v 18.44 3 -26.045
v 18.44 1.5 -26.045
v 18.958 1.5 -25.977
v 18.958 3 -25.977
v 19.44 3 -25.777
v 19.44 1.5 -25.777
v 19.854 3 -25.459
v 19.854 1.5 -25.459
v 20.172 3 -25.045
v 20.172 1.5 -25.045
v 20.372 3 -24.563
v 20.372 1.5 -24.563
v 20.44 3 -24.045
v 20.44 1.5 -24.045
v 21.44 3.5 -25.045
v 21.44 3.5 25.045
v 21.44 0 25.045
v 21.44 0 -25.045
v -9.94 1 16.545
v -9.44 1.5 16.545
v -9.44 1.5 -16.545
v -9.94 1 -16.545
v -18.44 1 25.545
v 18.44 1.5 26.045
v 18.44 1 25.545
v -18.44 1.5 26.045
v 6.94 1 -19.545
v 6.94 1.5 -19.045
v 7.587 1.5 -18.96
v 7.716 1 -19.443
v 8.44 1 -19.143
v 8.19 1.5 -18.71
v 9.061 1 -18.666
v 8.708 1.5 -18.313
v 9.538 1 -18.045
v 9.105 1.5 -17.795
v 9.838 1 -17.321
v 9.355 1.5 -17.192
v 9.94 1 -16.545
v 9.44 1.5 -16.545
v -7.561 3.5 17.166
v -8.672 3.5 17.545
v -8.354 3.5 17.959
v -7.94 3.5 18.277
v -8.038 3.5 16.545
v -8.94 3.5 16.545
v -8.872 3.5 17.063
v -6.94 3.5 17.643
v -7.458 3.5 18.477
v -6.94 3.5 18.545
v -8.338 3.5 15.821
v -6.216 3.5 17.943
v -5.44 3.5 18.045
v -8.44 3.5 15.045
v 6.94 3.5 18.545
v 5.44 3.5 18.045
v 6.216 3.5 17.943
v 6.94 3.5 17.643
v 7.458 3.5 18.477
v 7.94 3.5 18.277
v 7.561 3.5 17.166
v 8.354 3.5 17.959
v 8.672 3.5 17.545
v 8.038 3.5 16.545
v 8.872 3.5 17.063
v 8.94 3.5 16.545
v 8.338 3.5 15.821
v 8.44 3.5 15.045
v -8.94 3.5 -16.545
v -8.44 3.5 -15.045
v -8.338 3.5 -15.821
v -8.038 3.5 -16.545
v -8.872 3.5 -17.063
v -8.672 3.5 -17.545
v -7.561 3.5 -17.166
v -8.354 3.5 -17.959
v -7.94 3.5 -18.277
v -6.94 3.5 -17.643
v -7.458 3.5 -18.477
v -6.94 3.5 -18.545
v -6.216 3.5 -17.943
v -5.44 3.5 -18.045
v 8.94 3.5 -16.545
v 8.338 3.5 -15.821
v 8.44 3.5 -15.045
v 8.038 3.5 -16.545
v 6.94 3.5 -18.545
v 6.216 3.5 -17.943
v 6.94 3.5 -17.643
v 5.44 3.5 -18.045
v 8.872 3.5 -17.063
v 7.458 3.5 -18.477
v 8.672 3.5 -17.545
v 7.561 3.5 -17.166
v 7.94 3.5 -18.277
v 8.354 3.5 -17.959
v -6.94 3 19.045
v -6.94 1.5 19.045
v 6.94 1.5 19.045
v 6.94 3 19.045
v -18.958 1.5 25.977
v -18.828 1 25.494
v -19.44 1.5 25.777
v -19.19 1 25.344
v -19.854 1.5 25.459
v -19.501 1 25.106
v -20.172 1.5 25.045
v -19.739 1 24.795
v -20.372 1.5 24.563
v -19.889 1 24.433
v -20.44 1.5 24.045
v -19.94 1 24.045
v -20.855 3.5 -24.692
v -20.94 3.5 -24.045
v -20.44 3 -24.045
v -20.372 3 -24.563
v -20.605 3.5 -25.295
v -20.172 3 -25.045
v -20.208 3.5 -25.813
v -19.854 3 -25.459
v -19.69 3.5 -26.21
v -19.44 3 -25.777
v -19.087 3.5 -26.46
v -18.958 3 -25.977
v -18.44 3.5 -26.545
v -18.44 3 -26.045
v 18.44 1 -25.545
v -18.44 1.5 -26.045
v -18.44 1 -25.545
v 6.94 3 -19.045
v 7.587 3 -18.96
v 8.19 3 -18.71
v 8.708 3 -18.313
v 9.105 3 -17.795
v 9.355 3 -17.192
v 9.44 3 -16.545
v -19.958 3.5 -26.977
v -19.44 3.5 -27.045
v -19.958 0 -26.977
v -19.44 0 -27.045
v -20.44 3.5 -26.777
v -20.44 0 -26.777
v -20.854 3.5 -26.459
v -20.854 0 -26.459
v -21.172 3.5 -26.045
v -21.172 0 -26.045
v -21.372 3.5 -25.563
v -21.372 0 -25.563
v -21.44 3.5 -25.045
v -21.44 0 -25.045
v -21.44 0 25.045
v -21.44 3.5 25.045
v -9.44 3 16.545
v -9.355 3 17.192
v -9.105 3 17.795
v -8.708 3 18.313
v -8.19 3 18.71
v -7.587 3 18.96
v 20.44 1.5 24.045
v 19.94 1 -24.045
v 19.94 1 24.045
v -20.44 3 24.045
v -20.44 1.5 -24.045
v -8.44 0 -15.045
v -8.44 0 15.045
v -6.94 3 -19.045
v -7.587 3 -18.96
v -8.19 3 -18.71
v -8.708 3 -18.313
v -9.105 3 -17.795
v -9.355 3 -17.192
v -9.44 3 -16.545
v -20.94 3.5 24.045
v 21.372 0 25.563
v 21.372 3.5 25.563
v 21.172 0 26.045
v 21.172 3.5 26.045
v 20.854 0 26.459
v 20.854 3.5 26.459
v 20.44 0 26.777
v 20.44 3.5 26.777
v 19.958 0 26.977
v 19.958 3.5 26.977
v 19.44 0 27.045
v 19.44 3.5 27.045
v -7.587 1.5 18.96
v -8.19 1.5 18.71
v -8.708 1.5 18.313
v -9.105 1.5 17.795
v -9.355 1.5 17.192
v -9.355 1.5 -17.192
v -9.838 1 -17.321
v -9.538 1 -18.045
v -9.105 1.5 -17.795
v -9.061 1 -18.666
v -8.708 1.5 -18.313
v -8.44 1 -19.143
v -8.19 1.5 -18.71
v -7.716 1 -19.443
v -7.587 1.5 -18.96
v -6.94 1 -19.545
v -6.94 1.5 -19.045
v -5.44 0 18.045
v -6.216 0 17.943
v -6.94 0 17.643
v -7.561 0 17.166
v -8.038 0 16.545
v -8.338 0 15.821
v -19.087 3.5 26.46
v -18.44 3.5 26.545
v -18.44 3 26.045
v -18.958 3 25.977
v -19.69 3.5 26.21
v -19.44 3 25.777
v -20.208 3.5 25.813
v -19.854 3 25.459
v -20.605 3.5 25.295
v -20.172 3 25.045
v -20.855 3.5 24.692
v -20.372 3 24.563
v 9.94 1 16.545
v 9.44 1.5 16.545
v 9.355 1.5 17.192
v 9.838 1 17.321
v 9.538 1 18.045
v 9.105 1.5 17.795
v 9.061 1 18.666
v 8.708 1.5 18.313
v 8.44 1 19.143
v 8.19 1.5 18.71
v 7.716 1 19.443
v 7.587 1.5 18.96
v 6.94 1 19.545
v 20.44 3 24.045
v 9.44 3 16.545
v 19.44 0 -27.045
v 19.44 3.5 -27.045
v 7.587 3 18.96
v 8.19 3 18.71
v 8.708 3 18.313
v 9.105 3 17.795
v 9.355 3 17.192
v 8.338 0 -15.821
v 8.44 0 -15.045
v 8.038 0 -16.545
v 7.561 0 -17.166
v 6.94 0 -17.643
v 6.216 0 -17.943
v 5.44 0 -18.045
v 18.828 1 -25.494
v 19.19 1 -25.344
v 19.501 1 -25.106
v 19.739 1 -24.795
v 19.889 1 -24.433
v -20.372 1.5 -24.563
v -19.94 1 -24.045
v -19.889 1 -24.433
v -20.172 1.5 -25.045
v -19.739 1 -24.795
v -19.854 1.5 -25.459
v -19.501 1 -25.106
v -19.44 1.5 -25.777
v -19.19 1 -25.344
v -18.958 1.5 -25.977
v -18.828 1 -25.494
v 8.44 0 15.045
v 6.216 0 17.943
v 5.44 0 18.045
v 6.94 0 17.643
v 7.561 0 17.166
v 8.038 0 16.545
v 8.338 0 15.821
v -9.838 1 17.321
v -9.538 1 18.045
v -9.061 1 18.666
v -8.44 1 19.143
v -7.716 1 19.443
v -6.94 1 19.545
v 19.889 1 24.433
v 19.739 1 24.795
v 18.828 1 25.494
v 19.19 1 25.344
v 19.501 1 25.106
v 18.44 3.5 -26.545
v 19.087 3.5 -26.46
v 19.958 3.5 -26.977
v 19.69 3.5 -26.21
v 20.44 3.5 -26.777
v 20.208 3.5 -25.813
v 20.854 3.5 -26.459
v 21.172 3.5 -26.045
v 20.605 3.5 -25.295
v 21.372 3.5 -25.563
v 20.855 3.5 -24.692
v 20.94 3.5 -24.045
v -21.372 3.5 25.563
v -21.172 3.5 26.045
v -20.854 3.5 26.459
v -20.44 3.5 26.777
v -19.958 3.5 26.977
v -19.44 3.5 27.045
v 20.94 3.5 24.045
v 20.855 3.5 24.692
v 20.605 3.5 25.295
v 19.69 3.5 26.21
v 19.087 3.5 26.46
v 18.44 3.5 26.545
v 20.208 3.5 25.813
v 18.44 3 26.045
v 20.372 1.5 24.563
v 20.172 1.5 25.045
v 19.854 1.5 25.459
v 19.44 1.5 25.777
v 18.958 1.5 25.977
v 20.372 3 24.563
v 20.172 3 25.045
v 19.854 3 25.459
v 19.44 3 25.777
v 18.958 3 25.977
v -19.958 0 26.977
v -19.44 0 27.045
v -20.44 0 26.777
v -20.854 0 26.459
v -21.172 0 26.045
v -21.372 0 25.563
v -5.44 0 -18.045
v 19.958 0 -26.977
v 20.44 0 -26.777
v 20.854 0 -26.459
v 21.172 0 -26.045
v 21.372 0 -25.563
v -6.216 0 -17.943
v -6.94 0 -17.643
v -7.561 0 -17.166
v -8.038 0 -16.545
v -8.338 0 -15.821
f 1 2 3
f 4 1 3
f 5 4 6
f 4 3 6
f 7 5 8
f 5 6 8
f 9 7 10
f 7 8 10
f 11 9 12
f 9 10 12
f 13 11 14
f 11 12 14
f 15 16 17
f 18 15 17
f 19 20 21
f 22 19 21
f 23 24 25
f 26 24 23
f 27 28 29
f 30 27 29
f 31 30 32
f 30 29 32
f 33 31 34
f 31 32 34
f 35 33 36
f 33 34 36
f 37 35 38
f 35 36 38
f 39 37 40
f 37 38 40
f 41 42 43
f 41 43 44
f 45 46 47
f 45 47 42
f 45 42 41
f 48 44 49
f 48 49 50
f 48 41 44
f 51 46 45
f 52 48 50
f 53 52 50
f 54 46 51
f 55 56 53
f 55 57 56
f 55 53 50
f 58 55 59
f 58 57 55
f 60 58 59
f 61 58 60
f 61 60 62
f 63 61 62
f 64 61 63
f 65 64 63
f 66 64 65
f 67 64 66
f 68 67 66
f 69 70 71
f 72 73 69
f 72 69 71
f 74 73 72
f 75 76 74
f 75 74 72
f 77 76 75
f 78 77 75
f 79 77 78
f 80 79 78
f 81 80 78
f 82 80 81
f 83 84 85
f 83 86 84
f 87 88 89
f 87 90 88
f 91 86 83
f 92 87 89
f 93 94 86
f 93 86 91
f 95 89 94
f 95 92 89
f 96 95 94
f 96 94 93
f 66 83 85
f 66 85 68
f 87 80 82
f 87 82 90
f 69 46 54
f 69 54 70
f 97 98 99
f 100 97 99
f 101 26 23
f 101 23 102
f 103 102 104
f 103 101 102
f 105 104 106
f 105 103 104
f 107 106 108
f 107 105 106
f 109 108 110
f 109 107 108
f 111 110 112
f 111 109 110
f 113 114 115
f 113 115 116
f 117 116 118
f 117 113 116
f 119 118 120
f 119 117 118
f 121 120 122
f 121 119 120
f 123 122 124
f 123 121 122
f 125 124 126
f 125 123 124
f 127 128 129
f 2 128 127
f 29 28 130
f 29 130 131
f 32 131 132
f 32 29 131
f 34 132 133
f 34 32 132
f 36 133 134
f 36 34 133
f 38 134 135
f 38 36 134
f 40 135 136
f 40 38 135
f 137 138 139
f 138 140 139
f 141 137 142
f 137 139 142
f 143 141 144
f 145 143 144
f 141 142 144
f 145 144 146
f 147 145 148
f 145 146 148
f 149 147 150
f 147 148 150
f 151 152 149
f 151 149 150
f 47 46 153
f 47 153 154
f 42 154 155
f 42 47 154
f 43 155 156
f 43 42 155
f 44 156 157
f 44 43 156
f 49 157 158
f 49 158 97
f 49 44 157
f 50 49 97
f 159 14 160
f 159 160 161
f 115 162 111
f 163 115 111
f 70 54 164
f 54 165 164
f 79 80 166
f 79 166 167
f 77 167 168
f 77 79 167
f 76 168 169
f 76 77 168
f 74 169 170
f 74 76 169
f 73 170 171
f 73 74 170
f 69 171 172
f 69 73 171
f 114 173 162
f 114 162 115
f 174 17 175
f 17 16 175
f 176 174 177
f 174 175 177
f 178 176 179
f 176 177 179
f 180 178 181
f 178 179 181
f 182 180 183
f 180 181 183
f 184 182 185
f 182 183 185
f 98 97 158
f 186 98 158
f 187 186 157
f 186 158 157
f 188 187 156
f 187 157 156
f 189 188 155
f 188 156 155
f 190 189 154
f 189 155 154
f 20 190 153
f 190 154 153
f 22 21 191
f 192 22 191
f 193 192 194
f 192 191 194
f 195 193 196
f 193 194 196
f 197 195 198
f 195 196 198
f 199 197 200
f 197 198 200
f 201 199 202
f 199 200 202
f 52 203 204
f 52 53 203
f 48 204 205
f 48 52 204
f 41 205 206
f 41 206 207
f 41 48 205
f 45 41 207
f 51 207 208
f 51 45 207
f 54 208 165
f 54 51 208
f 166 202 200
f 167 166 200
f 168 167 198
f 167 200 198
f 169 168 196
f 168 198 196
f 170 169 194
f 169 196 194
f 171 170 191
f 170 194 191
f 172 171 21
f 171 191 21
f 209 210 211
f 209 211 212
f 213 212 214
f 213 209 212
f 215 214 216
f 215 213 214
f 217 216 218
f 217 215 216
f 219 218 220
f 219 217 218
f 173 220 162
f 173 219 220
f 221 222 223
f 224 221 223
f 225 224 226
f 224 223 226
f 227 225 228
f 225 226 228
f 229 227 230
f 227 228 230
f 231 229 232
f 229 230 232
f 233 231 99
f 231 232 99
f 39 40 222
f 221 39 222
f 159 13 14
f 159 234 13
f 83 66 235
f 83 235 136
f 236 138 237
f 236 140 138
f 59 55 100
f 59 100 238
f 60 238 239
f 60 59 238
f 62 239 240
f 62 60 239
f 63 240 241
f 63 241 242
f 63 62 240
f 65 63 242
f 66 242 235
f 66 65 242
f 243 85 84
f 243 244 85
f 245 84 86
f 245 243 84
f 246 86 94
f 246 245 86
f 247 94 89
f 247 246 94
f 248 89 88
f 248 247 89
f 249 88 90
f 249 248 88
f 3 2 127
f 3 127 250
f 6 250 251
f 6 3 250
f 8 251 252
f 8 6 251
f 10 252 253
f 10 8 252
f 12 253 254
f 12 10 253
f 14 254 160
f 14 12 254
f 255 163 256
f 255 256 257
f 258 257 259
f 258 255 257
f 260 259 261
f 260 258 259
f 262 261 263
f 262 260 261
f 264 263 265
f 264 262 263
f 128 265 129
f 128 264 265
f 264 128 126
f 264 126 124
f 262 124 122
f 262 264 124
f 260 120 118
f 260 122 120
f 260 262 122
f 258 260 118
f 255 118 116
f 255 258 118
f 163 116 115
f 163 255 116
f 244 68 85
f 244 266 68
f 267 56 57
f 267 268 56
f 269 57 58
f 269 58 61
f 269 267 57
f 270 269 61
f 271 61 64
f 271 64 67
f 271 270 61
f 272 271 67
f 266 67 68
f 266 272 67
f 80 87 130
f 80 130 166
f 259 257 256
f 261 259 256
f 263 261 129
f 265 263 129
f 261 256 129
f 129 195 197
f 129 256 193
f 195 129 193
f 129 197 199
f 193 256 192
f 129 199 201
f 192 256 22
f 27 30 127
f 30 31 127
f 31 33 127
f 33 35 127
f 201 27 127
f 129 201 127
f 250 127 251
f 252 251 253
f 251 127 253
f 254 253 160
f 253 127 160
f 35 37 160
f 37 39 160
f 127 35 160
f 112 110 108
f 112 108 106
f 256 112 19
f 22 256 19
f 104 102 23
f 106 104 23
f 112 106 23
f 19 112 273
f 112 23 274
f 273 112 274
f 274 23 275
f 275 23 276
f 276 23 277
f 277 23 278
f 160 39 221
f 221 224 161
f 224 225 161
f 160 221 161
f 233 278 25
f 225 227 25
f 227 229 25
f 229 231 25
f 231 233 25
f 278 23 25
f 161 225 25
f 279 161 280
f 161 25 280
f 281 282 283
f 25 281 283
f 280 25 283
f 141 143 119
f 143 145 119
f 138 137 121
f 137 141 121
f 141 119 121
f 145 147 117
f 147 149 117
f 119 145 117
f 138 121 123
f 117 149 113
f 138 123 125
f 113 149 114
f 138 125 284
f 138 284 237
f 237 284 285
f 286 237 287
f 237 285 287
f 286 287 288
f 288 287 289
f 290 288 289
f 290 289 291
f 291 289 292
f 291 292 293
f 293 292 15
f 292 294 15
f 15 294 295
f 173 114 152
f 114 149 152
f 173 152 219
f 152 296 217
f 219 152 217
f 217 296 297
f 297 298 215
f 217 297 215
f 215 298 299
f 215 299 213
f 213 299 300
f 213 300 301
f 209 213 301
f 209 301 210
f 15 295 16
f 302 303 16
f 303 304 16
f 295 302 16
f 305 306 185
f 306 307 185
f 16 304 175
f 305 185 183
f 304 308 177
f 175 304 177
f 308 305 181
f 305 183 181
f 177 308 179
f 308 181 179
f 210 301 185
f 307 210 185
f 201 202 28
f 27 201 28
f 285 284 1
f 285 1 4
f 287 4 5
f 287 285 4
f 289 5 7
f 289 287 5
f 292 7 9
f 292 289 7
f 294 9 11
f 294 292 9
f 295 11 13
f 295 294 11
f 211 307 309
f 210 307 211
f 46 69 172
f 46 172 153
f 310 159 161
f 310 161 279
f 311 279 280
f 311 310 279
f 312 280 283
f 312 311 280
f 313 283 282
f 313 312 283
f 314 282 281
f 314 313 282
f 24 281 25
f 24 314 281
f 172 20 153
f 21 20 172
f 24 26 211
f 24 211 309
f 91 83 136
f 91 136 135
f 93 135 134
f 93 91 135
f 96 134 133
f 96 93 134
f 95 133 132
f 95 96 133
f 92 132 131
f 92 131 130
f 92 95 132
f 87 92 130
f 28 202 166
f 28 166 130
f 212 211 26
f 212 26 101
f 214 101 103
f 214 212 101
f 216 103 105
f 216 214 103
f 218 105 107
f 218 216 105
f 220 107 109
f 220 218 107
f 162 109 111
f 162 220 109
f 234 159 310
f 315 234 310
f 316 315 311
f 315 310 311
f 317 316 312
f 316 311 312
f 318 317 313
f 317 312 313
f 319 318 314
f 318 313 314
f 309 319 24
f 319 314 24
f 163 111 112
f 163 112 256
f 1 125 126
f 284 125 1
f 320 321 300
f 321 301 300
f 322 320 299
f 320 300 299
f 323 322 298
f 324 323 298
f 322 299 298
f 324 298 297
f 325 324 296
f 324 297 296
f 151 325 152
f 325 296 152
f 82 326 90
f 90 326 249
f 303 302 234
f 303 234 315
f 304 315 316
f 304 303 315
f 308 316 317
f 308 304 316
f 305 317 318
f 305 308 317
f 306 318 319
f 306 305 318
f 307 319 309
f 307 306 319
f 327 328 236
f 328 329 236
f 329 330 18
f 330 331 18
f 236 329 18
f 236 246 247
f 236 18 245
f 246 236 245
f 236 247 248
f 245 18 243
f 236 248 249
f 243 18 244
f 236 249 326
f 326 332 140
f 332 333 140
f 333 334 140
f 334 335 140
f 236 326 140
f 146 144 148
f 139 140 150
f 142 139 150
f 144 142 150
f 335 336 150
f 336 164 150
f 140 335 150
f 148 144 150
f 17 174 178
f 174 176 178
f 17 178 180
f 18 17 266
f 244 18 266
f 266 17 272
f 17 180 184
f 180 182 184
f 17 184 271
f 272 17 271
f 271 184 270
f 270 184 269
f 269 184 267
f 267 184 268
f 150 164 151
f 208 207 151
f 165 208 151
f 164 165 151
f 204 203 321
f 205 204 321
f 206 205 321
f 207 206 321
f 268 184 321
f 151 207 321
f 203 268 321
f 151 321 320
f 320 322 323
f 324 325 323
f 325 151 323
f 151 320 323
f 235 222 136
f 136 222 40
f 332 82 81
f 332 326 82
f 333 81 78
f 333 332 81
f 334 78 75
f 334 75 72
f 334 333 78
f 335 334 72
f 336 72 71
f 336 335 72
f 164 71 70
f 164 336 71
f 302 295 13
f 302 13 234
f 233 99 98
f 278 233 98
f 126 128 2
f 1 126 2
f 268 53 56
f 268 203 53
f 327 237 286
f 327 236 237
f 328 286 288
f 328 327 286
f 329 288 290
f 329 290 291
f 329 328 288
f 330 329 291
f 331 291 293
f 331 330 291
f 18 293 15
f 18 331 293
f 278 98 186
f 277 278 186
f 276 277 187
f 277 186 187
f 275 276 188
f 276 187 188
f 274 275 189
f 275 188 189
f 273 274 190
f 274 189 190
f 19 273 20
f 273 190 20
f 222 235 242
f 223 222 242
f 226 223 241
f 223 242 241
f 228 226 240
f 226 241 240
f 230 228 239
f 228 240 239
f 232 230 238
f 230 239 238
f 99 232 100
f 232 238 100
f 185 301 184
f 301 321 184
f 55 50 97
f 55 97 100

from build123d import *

# Parameters (mm, degrees)
SKETCH1_W              = 11
SKETCH1_H              = 38.09
BOSS_EXTRUDE1_DEPTH    = 3
BOSS_EXTRUDE2_DEPTH    = 3
SKETCH3_W              = 40.88
SKETCH3_H              = 46.09
CUT_EXTRUDE1_DEPTH     = 2
MOVE_START             = 3
MOVE_FACE1_OUTLINE_W   = 42.88
MOVE_FACE1_OUTLINE_H   = 48.09
MOVE_FACE1_OUTLINE_W_2 = 40.88
MOVE_FACE1_OUTLINE_H_2 = 46.09
MOVE_FACE1_DEPTH       = 0.5
MOVE_FACE2_OUTLINE_W   = 18.88
MOVE_FACE2_OUTLINE_H   = 38.09
MOVE_FACE2_OUTLINE_W_2 = 16.88
MOVE_FACE2_OUTLINE_H_2 = 36.09
MOVE_FACE2_DEPTH       = 0.5
FILLET3_R              = 3
MOVE_FACE4_BY          = 3
MOVE_FACE5_BY          = 3
MOVE_FACE6_BY          = 3
MOVE_FACE7_BY          = 3
FILLET4_R              = 2.5
FILLET5_R              = 2
CHAMFER1_SIZE          = 0.5


# Read off the part's stored shape, not the designer's step: Move Face1, Move Face2
with BuildPart() as part:
    # Sketch1 → Boss-Extrude1 (new body)
    with BuildSketch(Plane(origin=(0, 0, 0), x_dir=(1, 0, 0), z_dir=(0, 1, 0))):
        Polygon((-9.44, 19.045), (0, 19.045), (9.44, 19.045), (9.44, -19.045), (20.44, -19.045), (20.44, 23.045), (-20.44, 23.045), (-20.44, 19.045), align=None)
        with Locations((-14.94, 0)):
            Rectangle(SKETCH1_W, SKETCH1_H)
        Polygon((9.44, -19.045), (0, -19.045), (-9.44, -19.045), (-20.44, -19.045), (-20.44, -23.045), (20.44, -23.045), (20.44, -19.045), align=None)
    extrude(amount=BOSS_EXTRUDE1_DEPTH)

    # Sketch2 → Boss-Extrude2 (add)
    with BuildSketch(Plane(origin=(0, 3, 0), x_dir=(1, 0, 0), z_dir=(0, 1, 0))):
        Polygon((20.44, 23.045), (20.44, -23.045), (21.44, -23.045), (21.44, 24.045), (-21.44, 24.045), (-21.44, 23.045), (-20.44, 23.045), align=None)
        Polygon((21.44, -23.045), (20.44, -23.045), (-20.44, -23.045), (-20.44, 23.045), (-21.44, 23.045), (-21.44, -24.045), (21.44, -24.045), align=None)
        Polygon((-8.44, 19.045), (-9.44, 19.045), (-9.44, -19.045), (8.44, -19.045), (8.44, -18.045), (-8.44, -18.045), (-8.44, 18.045), align=None)
        Polygon((9.44, 19.045), (-8.44, 19.045), (-8.44, 18.045), (8.44, 18.045), (8.44, -18.045), (8.44, -19.045), (9.44, -19.045), align=None)
    extrude(amount=-BOSS_EXTRUDE2_DEPTH)

    # Sketch3 → Cut-Extrude1 (cut)
    with BuildSketch(Plane(origin=(0, 3, 0), x_dir=(1, 0, 0), z_dir=(0, 1, 0))):
        Rectangle(SKETCH3_W, SKETCH3_H)
        Polygon((9.44, 19.045), (9.44, -18.045), (9.44, -19.045), (-9.44, -19.045), (-9.44, 18.045), (-9.44, 19.045), align=None, mode=Mode.SUBTRACT)
    extrude(amount=-CUT_EXTRUDE1_DEPTH, mode=Mode.SUBTRACT)

    # Move Face1 outline → Move Face1 (add)
    with BuildSketch(Plane(origin=(0, 0, 0), x_dir=(1, 0, 0), z_dir=(0, 1, 0)).offset(MOVE_START)):
        Rectangle(MOVE_FACE1_OUTLINE_W, MOVE_FACE1_OUTLINE_H)
        Rectangle(MOVE_FACE1_OUTLINE_W_2, MOVE_FACE1_OUTLINE_H_2, mode=Mode.SUBTRACT)
    extrude(amount=MOVE_FACE1_DEPTH)

    # Move Face2 outline → Move Face2 (add)
    with BuildSketch(Plane(origin=(0, 0, 0), x_dir=(1, 0, 0), z_dir=(0, 1, 0)).offset(MOVE_START)):
        Rectangle(MOVE_FACE2_OUTLINE_W, MOVE_FACE2_OUTLINE_H)
        Rectangle(MOVE_FACE2_OUTLINE_W_2, MOVE_FACE2_OUTLINE_H_2, mode=Mode.SUBTRACT)
    extrude(amount=MOVE_FACE2_DEPTH)

    # Fillet3
    fillet3_edges = [part.edges().sort_by_distance(p)[0] for p in [
        (-8.44, 1.75, -18.045),
        (-8.44, 1.75, 18.045),
        (8.44, 1.75, 18.045),
        (8.44, 1.75, -18.045),
    ]]
    fillet(fillet3_edges, radius=FILLET3_R)

    # Move Face4: a face moved outward by 3.0
    extrude(part.faces().sort_by_distance((0, 1.75, 24.045))[0], amount=MOVE_FACE4_BY, dir=(0, 0, 1))

    # Move Face5: a face moved outward by 3.0
    extrude(part.faces().sort_by_distance((0, 1.75, -24.045))[0], amount=MOVE_FACE5_BY, dir=(0, 0, -1))

    # Move Face6: a face moved inward by 3.0
    extrude(part.faces().sort_by_distance((0, 2.25, 23.045))[0], amount=MOVE_FACE6_BY, dir=(0, 0, 1), mode=Mode.SUBTRACT)

    # Move Face7: a face moved inward by 3.0
    extrude(part.faces().sort_by_distance((0, 2.25, -23.045))[0], amount=MOVE_FACE7_BY, dir=(0, 0, -1), mode=Mode.SUBTRACT)

    # Fillet4
    fillet4_edges = [part.edges().sort_by_distance(p)[0] for p in [
        (-9.44, 2.25, 19.045),
        (9.44, 2.25, 19.045),
        (9.44, 2.25, -19.045),
        (-9.44, 2.25, -19.045),
    ]]
    fillet(fillet4_edges, radius=FILLET4_R)

    # Fillet5
    fillet5_edges = [part.edges().sort_by_distance(p)[0] for p in [
        (-21.44, 1.75, 27.045),
        (-21.44, 1.75, -27.045),
        (21.44, 1.75, -27.045),
        (21.44, 1.75, 27.045),
        (-20.44, 2.25, 26.045),
        (-20.44, 2.25, -26.045),
        (20.44, 2.25, -26.045),
        (20.44, 2.25, 26.045),
    ]]
    fillet(fillet5_edges, radius=FILLET5_R)

    # Chamfer1
    chamfer1_edges = [part.edges().sort_by_distance(p)[0] for p in [
        (0, 3.5, 19.045),
        (0, 1, 19.045),
        (9.44, 3.5, 0),
        (0, 3.5, -19.045),
        (-9.44, 3.5, 0),
        (-8.707766953, 3.5, -18.312766953),
        (8.707766953, 3.5, -18.312766953),
        (-8.707766953, 3.5, 18.312766953),
        (8.707766953, 3.5, 18.312766953),
        (9.44, 1, 0),
        (-9.44, 1, 0),
        (0, 1, -19.045),
        (8.707766953, 1, 18.312766953),
        (-8.707766953, 1, 18.312766953),
        (8.707766953, 1, -18.312766953),
        (-8.707766953, 1, -18.312766953),
        (0, 3.5, -26.045),
        (0, 1, -26.045),
        (20.44, 3.5, 0),
        (20.44, 1, 0),
        (-20.44, 1, 0),
        (0, 1, 26.045),
        (19.854213562, 1, 25.459213562),
        (-19.854213562, 1, 25.459213562),
        (-19.854213562, 1, -25.459213562),
        (19.854213562, 1, -25.459213562),
        (-20.44, 3.5, 0),
        (0, 3.5, 26.045),
        (19.854213562, 3.5, -25.459213562),
        (-19.854213562, 3.5, -25.459213562),
        (-19.854213562, 3.5, 25.459213562),
        (19.854213562, 3.5, 25.459213562),
    ]]
    chamfer(chamfer1_edges, length=CHAMFER1_SIZE)


solid = part.part
